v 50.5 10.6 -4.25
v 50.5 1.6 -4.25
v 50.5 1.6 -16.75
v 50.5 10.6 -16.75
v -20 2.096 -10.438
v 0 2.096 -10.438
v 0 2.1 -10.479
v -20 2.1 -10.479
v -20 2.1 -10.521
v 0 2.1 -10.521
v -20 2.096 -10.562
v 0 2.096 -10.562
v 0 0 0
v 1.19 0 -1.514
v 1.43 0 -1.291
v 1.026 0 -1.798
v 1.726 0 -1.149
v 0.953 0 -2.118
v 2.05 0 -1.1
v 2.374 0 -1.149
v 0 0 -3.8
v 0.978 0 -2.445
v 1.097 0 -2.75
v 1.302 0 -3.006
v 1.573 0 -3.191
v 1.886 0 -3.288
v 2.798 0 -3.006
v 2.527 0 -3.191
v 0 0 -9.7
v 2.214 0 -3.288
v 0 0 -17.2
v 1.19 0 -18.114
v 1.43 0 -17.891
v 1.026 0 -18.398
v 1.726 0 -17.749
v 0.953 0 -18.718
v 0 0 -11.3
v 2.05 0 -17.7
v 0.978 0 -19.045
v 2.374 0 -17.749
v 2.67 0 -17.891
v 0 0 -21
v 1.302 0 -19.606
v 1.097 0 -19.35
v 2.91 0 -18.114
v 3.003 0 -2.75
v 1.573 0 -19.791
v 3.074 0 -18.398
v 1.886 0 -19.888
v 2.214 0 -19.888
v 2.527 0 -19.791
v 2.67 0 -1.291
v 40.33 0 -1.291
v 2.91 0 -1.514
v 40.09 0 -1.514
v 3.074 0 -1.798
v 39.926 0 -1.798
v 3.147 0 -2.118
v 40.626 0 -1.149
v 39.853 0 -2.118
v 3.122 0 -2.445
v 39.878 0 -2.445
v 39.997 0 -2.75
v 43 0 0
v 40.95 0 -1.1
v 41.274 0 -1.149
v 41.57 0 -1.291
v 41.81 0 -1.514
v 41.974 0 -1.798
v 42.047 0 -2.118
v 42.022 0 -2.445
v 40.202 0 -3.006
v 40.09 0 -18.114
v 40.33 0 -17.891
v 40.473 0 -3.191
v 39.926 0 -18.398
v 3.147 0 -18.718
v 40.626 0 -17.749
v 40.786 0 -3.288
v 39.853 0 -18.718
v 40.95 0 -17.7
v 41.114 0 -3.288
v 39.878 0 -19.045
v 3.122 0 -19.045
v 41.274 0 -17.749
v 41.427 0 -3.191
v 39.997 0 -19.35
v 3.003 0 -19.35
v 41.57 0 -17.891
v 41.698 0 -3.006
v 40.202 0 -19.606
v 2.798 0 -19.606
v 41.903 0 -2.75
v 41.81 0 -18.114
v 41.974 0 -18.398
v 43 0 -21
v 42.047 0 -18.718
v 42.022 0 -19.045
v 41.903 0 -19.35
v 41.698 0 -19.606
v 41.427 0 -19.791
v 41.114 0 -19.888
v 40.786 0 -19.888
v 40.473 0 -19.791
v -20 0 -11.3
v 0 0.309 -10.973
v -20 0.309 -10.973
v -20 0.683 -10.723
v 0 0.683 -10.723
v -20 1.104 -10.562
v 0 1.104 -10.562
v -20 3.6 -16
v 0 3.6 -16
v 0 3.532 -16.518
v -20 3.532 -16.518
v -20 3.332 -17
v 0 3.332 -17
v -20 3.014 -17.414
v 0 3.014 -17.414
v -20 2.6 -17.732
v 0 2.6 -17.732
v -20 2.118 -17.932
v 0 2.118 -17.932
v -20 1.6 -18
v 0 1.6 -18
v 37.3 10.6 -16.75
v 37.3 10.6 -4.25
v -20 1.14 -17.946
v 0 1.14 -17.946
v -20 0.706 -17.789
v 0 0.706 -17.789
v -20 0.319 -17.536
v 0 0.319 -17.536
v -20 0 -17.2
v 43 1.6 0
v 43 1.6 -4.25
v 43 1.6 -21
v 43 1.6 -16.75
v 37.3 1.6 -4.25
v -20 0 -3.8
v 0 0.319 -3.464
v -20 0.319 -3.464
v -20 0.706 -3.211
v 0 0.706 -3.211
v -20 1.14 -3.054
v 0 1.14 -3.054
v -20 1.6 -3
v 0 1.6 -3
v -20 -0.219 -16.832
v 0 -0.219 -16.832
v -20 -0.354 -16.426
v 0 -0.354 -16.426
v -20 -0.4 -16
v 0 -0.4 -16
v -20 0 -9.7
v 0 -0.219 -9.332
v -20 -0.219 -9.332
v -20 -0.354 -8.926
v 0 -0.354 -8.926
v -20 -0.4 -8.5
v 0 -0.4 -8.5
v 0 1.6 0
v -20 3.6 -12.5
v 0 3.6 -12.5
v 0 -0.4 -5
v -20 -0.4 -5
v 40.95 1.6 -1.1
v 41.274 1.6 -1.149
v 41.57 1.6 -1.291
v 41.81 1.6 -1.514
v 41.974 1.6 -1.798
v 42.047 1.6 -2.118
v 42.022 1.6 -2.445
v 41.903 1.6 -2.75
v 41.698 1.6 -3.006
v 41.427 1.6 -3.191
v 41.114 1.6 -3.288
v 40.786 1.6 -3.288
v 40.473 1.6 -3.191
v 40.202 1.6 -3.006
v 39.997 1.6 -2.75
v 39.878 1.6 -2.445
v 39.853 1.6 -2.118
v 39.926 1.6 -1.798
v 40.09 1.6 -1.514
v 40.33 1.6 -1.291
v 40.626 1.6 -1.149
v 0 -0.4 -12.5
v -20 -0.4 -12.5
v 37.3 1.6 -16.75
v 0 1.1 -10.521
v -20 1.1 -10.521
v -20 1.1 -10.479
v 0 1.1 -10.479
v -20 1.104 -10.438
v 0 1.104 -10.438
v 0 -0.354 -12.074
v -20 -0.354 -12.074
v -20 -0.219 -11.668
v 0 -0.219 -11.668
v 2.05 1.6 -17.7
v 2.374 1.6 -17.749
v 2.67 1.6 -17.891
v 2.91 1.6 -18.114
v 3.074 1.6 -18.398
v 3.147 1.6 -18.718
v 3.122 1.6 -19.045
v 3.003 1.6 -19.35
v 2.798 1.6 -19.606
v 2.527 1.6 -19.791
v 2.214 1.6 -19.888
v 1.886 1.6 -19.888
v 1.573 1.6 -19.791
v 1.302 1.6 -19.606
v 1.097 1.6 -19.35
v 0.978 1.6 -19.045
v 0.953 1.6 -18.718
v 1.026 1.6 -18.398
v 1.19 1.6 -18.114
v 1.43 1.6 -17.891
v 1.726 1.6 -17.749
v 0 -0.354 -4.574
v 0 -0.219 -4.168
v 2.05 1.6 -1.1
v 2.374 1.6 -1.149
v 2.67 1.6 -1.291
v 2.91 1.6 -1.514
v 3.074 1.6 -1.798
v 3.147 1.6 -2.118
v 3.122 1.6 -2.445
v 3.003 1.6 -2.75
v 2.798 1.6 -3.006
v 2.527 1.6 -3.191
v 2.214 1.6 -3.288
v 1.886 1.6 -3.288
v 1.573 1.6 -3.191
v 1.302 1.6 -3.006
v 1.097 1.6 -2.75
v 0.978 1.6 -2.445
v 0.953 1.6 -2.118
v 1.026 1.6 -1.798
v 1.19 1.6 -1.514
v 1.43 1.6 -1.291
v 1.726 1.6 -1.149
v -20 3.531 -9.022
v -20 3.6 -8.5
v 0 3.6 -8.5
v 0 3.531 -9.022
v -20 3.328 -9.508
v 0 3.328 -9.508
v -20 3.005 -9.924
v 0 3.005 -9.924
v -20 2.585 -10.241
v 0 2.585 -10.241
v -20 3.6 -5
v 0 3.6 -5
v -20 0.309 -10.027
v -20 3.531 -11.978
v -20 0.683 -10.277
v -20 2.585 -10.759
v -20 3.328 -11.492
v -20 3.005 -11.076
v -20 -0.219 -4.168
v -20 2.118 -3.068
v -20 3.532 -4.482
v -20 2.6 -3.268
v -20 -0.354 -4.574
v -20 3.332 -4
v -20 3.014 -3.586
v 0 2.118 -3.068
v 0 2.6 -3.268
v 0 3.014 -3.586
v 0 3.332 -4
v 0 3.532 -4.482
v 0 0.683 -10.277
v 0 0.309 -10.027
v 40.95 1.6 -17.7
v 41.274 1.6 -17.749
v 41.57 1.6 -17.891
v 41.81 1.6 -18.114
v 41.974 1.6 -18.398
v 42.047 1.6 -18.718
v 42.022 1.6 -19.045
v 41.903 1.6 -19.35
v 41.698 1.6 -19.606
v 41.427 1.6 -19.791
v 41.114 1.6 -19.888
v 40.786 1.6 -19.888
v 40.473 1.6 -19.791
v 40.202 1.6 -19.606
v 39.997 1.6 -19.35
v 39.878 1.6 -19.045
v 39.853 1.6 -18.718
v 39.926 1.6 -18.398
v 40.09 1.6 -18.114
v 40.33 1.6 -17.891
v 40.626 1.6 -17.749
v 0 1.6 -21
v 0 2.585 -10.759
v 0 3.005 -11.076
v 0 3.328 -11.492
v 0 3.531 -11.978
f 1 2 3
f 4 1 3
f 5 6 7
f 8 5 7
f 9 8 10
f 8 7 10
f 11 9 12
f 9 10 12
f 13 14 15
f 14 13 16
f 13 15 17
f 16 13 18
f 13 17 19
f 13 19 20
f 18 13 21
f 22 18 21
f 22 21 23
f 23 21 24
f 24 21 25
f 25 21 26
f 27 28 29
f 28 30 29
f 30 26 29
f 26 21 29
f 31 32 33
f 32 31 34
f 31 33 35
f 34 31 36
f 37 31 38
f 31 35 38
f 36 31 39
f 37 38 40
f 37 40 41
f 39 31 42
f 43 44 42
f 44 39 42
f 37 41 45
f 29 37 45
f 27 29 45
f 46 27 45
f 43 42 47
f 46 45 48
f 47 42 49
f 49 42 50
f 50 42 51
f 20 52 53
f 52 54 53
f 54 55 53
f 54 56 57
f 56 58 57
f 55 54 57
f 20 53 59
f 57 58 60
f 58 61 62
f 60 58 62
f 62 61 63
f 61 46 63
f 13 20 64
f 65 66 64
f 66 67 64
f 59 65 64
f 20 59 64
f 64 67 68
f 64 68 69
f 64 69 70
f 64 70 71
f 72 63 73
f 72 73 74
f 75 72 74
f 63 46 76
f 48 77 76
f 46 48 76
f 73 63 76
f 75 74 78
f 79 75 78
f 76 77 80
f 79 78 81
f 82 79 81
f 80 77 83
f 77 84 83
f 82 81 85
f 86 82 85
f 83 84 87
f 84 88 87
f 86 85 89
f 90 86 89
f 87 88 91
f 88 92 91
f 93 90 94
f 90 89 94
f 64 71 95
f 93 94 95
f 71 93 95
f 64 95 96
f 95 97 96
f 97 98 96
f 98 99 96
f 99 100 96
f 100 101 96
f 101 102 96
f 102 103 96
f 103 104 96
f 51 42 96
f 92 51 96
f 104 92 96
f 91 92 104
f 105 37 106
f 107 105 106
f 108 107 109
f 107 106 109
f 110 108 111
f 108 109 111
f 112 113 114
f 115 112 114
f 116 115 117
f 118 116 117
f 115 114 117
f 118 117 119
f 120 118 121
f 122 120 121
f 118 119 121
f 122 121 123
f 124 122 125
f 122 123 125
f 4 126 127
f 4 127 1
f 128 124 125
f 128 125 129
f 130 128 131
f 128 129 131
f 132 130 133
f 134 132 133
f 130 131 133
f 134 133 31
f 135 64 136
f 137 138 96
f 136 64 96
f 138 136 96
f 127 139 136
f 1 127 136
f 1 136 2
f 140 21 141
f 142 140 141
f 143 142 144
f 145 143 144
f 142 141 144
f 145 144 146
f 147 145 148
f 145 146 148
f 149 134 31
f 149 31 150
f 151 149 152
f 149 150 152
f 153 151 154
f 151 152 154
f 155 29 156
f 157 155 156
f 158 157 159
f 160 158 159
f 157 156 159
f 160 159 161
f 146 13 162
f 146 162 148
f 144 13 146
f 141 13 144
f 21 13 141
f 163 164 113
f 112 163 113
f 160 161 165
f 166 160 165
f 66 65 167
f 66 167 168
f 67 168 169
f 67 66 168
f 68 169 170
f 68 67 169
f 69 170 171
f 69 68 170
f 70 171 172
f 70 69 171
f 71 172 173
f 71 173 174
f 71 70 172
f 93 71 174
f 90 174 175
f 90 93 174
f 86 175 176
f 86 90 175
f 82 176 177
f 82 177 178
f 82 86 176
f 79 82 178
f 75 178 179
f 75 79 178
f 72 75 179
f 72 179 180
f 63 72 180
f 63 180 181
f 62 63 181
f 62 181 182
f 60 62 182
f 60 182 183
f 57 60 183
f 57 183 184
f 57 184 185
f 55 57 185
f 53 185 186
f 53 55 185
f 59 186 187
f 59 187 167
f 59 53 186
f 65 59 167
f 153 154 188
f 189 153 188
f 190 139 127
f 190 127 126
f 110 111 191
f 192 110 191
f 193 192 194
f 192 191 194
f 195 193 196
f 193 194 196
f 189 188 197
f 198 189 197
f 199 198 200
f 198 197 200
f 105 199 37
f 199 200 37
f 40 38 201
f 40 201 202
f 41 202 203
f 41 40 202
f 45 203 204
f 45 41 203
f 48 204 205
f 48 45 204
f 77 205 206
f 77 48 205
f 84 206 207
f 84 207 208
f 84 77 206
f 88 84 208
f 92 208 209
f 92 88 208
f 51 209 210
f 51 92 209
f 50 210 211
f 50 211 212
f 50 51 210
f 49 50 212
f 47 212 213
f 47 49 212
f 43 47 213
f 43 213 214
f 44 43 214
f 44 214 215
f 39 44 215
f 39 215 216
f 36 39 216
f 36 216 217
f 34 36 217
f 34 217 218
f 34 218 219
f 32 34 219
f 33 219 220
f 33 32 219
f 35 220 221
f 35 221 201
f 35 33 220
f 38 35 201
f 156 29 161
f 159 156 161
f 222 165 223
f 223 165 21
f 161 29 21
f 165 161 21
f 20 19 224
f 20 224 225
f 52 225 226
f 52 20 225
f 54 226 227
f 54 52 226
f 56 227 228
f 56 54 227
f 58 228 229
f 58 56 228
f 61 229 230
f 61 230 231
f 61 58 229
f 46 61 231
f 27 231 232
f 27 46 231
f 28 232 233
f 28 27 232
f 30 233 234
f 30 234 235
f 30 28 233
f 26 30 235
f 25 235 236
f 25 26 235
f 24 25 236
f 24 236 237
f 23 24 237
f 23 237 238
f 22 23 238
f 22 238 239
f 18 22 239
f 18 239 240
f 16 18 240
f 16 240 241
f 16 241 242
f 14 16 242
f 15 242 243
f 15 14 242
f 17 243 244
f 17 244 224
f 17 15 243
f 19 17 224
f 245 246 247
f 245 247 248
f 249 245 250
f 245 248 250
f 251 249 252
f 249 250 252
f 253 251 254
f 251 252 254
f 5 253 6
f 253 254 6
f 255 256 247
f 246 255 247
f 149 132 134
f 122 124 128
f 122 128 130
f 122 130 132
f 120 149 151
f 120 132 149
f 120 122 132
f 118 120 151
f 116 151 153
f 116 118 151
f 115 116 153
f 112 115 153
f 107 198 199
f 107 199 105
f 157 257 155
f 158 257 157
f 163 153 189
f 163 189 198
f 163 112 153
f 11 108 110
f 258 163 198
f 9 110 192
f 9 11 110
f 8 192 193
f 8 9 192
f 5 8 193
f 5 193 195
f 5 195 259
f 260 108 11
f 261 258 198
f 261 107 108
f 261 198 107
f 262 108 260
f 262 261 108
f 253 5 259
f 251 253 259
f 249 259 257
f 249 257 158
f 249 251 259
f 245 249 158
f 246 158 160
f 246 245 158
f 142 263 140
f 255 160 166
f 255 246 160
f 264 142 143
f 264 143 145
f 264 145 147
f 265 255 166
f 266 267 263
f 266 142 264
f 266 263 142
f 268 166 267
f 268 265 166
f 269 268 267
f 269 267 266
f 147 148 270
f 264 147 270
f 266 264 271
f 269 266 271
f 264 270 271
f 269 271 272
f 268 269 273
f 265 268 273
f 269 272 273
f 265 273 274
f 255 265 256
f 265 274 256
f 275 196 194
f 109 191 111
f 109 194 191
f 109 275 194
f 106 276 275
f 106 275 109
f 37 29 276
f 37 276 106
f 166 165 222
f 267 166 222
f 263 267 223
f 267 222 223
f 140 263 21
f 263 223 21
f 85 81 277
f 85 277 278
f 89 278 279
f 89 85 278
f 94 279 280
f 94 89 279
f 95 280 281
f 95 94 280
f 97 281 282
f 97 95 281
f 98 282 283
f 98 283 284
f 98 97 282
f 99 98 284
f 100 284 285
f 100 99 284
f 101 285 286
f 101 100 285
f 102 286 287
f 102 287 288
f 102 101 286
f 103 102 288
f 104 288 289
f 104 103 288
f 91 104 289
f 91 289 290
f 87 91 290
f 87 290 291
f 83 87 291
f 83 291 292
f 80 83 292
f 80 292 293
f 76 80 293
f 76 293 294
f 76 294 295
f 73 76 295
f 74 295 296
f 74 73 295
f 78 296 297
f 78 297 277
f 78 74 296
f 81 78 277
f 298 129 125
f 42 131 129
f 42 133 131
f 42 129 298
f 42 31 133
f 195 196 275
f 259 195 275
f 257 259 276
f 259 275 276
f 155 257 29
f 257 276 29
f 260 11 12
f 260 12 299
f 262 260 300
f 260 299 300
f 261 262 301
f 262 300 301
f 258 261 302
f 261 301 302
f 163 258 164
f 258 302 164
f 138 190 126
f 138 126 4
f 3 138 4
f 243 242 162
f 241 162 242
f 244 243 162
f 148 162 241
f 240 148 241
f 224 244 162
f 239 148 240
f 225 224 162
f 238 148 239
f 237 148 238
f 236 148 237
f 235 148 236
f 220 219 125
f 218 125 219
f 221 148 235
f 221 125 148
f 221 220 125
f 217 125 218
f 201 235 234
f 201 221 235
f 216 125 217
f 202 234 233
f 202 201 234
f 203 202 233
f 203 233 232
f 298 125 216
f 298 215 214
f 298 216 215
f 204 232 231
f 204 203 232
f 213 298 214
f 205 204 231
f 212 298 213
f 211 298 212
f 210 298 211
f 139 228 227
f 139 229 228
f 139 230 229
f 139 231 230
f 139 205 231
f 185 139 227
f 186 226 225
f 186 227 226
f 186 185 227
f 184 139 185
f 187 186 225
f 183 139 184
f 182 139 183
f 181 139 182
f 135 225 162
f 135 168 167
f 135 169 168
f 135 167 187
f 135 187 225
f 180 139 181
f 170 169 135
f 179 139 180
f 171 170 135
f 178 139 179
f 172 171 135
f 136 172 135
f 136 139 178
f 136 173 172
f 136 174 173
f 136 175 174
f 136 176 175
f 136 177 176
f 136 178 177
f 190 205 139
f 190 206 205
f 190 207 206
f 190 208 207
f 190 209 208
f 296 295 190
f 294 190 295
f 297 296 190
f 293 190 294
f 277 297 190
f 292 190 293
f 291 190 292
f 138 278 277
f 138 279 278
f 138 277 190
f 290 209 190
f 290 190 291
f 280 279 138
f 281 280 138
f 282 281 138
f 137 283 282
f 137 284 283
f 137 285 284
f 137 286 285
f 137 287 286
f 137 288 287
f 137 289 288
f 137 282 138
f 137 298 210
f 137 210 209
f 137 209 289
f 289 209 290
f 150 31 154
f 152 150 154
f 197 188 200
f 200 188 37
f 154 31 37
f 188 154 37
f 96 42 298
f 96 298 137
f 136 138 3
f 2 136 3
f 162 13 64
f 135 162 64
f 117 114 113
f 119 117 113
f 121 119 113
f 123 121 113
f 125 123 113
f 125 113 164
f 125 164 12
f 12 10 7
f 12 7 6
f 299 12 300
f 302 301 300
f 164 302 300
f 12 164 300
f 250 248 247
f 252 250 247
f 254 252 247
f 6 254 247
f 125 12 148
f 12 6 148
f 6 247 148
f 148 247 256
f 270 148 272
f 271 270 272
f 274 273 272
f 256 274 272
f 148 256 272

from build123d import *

# Parameters (mm, degrees)
SKETCH1_W           = 43
SKETCH1_H           = 21
SKETCH1_R           = 1.1
BOSS_EXTRUDE1_DEPTH = 1.6
BOSS_EXTRUDE2_DEPTH = 20
SKETCH3_W           = 13.2
SKETCH3_H           = 12.5
BOSS_EXTRUDE3_DEPTH = 9


with BuildPart() as part:
    # Sketch1 → Boss-Extrude1 (new body)
    with BuildSketch(Plane(origin=(0, 0, 0), x_dir=(1, 0, 0), z_dir=(0, 1, 0))):
        with Locations((21.5, 10.5)):
            Rectangle(SKETCH1_W, SKETCH1_H)
        with Locations(Location((2.05, 18.8, 0), (0, 0, 270))):
            Circle(SKETCH1_R, mode=Mode.SUBTRACT)
        with Locations(Location((40.95, 18.8, 0), (0, 0, 270))):
            Circle(SKETCH1_R, mode=Mode.SUBTRACT)
        with Locations(Location((40.95, 2.2, 0), (0, 0, 270))):
            Circle(SKETCH1_R, mode=Mode.SUBTRACT)
        with Locations(Location((2.05, 2.2, 0), (0, 0, 270))):
            Circle(SKETCH1_R, mode=Mode.SUBTRACT)
    extrude(amount=BOSS_EXTRUDE1_DEPTH)

    # Sketch2 → Boss-Extrude2 (add)
    with BuildSketch(Plane.ZY):
        with BuildLine():
            ThreePointArc((-16, 3.6), (-17.414213562, 3.014213562), (-18, 1.6))
            Line((-18, 1.6), (-11, 1.6))
            ThreePointArc((-11, 1.6), (-10.875, 1.930718914), (-10.5625, 2.096078371))
            ThreePointArc((-10.5625, 2.096078371), (-11.273655175, 3.179898215), (-12.5, 3.6))
            Line((-12.5, 3.6), (-16, 3.6))
        make_face()
        with BuildLine():
            Line((-17.2, 0), (-11.3, 0))
            ThreePointArc((-11.3, 0), (-10.836979464, 0.488981235), (-10.5625, 1.103921629))
            ThreePointArc((-10.5625, 1.103921629), (-10.875, 1.269281086), (-11, 1.6))
            Line((-11, 1.6), (-18, 1.6))
            ThreePointArc((-18, 1.6), (-17.788854382, 0.705572809), (-17.2, 0))
        make_face()
        with BuildLine():
            Line((-16, -0.4), (-12.5, -0.4))
            ThreePointArc((-12.5, -0.4), (-11.867544468, -0.297366596), (-11.3, 0))
            Line((-11.3, 0), (-17.2, 0))
            ThreePointArc((-17.2, 0), (-16.632455532, -0.297366596), (-16, -0.4))
        make_face()
        with BuildLine():
            ThreePointArc((-11, 1.6), (-10.875, 1.269281086), (-10.5625, 1.103921629))
            ThreePointArc((-10.5625, 1.103921629), (-10.515686517, 1.35), (-10.5, 1.6))
            Line((-10.5, 1.6), (-11, 1.6))
        make_face()
        with BuildLine():
            Line((-11, 1.6), (-10.5, 1.6))
            ThreePointArc((-10.5, 1.6), (-10.515686517, 1.85), (-10.5625, 2.096078371))
            ThreePointArc((-10.5625, 2.096078371), (-10.875, 1.930718914), (-11, 1.6))
        make_face()
        with BuildLine():
            ThreePointArc((-10.5, 1.6), (-10.515686517, 1.35), (-10.5625, 1.103921629))
            ThreePointArc((-10.5625, 1.103921629), (-10.5, 1.1), (-10.4375, 1.103921629))
            ThreePointArc((-10.4375, 1.103921629), (-10.484313483, 1.35), (-10.5, 1.6))
        make_face()
        with BuildLine():
            ThreePointArc((-10.5625, 2.096078371), (-10.515686517, 1.85), (-10.5, 1.6))
            ThreePointArc((-10.5, 1.6), (-10.484313483, 1.85), (-10.4375, 2.096078371))
            ThreePointArc((-10.4375, 2.096078371), (-10.5, 2.1), (-10.5625, 2.096078371))
        make_face()
        with BuildLine():
            Line((-10, 1.6), (-10.5, 1.6))
            ThreePointArc((-10.5, 1.6), (-10.484313483, 1.35), (-10.4375, 1.103921629))
            ThreePointArc((-10.4375, 1.103921629), (-10.125, 1.269281086), (-10, 1.6))
        make_face()
        with BuildLine():
            ThreePointArc((-10.4375, 2.096078371), (-10.484313483, 1.85), (-10.5, 1.6))
            Line((-10.5, 1.6), (-10, 1.6))
            ThreePointArc((-10, 1.6), (-10.125, 1.930718914), (-10.4375, 2.096078371))
        make_face()
        with BuildLine():
            ThreePointArc((-10.4375, 1.103921629), (-10.163020536, 0.488981235), (-9.7, 0))
            Line((-9.7, 0), (-3.8, 0))
            ThreePointArc((-3.8, 0), (-3.211145618, 0.705572809), (-3, 1.6))
            Line((-3, 1.6), (-10, 1.6))
            ThreePointArc((-10, 1.6), (-10.125, 1.269281086), (-10.4375, 1.103921629))
        make_face()
        with BuildLine():
            ThreePointArc((-8.5, 3.6), (-9.726344825, 3.179898215), (-10.4375, 2.096078371))
            ThreePointArc((-10.4375, 2.096078371), (-10.125, 1.930718914), (-10, 1.6))
            Line((-10, 1.6), (-3, 1.6))
            ThreePointArc((-3, 1.6), (-3.585786438, 3.014213562), (-5, 3.6))
            Line((-5, 3.6), (-8.5, 3.6))
        make_face()
        with BuildLine():
            Line((-3.8, 0), (-9.7, 0))
            ThreePointArc((-9.7, 0), (-9.132455532, -0.297366596), (-8.5, -0.4))
            Line((-8.5, -0.4), (-5, -0.4))
            ThreePointArc((-5, -0.4), (-4.367544468, -0.297366596), (-3.8, 0))
        make_face()
    extrude(amount=BOSS_EXTRUDE2_DEPTH)

    # Sketch3 → Boss-Extrude3 (add)
    with BuildSketch(Plane(origin=(0, 1.6, 0), x_dir=(1, 0, 0), z_dir=(0, 1, 0))):
        with Locations((43.9, 10.5)):
            Rectangle(SKETCH3_W, SKETCH3_H)
    extrude(amount=BOSS_EXTRUDE3_DEPTH)


solid = part.part
